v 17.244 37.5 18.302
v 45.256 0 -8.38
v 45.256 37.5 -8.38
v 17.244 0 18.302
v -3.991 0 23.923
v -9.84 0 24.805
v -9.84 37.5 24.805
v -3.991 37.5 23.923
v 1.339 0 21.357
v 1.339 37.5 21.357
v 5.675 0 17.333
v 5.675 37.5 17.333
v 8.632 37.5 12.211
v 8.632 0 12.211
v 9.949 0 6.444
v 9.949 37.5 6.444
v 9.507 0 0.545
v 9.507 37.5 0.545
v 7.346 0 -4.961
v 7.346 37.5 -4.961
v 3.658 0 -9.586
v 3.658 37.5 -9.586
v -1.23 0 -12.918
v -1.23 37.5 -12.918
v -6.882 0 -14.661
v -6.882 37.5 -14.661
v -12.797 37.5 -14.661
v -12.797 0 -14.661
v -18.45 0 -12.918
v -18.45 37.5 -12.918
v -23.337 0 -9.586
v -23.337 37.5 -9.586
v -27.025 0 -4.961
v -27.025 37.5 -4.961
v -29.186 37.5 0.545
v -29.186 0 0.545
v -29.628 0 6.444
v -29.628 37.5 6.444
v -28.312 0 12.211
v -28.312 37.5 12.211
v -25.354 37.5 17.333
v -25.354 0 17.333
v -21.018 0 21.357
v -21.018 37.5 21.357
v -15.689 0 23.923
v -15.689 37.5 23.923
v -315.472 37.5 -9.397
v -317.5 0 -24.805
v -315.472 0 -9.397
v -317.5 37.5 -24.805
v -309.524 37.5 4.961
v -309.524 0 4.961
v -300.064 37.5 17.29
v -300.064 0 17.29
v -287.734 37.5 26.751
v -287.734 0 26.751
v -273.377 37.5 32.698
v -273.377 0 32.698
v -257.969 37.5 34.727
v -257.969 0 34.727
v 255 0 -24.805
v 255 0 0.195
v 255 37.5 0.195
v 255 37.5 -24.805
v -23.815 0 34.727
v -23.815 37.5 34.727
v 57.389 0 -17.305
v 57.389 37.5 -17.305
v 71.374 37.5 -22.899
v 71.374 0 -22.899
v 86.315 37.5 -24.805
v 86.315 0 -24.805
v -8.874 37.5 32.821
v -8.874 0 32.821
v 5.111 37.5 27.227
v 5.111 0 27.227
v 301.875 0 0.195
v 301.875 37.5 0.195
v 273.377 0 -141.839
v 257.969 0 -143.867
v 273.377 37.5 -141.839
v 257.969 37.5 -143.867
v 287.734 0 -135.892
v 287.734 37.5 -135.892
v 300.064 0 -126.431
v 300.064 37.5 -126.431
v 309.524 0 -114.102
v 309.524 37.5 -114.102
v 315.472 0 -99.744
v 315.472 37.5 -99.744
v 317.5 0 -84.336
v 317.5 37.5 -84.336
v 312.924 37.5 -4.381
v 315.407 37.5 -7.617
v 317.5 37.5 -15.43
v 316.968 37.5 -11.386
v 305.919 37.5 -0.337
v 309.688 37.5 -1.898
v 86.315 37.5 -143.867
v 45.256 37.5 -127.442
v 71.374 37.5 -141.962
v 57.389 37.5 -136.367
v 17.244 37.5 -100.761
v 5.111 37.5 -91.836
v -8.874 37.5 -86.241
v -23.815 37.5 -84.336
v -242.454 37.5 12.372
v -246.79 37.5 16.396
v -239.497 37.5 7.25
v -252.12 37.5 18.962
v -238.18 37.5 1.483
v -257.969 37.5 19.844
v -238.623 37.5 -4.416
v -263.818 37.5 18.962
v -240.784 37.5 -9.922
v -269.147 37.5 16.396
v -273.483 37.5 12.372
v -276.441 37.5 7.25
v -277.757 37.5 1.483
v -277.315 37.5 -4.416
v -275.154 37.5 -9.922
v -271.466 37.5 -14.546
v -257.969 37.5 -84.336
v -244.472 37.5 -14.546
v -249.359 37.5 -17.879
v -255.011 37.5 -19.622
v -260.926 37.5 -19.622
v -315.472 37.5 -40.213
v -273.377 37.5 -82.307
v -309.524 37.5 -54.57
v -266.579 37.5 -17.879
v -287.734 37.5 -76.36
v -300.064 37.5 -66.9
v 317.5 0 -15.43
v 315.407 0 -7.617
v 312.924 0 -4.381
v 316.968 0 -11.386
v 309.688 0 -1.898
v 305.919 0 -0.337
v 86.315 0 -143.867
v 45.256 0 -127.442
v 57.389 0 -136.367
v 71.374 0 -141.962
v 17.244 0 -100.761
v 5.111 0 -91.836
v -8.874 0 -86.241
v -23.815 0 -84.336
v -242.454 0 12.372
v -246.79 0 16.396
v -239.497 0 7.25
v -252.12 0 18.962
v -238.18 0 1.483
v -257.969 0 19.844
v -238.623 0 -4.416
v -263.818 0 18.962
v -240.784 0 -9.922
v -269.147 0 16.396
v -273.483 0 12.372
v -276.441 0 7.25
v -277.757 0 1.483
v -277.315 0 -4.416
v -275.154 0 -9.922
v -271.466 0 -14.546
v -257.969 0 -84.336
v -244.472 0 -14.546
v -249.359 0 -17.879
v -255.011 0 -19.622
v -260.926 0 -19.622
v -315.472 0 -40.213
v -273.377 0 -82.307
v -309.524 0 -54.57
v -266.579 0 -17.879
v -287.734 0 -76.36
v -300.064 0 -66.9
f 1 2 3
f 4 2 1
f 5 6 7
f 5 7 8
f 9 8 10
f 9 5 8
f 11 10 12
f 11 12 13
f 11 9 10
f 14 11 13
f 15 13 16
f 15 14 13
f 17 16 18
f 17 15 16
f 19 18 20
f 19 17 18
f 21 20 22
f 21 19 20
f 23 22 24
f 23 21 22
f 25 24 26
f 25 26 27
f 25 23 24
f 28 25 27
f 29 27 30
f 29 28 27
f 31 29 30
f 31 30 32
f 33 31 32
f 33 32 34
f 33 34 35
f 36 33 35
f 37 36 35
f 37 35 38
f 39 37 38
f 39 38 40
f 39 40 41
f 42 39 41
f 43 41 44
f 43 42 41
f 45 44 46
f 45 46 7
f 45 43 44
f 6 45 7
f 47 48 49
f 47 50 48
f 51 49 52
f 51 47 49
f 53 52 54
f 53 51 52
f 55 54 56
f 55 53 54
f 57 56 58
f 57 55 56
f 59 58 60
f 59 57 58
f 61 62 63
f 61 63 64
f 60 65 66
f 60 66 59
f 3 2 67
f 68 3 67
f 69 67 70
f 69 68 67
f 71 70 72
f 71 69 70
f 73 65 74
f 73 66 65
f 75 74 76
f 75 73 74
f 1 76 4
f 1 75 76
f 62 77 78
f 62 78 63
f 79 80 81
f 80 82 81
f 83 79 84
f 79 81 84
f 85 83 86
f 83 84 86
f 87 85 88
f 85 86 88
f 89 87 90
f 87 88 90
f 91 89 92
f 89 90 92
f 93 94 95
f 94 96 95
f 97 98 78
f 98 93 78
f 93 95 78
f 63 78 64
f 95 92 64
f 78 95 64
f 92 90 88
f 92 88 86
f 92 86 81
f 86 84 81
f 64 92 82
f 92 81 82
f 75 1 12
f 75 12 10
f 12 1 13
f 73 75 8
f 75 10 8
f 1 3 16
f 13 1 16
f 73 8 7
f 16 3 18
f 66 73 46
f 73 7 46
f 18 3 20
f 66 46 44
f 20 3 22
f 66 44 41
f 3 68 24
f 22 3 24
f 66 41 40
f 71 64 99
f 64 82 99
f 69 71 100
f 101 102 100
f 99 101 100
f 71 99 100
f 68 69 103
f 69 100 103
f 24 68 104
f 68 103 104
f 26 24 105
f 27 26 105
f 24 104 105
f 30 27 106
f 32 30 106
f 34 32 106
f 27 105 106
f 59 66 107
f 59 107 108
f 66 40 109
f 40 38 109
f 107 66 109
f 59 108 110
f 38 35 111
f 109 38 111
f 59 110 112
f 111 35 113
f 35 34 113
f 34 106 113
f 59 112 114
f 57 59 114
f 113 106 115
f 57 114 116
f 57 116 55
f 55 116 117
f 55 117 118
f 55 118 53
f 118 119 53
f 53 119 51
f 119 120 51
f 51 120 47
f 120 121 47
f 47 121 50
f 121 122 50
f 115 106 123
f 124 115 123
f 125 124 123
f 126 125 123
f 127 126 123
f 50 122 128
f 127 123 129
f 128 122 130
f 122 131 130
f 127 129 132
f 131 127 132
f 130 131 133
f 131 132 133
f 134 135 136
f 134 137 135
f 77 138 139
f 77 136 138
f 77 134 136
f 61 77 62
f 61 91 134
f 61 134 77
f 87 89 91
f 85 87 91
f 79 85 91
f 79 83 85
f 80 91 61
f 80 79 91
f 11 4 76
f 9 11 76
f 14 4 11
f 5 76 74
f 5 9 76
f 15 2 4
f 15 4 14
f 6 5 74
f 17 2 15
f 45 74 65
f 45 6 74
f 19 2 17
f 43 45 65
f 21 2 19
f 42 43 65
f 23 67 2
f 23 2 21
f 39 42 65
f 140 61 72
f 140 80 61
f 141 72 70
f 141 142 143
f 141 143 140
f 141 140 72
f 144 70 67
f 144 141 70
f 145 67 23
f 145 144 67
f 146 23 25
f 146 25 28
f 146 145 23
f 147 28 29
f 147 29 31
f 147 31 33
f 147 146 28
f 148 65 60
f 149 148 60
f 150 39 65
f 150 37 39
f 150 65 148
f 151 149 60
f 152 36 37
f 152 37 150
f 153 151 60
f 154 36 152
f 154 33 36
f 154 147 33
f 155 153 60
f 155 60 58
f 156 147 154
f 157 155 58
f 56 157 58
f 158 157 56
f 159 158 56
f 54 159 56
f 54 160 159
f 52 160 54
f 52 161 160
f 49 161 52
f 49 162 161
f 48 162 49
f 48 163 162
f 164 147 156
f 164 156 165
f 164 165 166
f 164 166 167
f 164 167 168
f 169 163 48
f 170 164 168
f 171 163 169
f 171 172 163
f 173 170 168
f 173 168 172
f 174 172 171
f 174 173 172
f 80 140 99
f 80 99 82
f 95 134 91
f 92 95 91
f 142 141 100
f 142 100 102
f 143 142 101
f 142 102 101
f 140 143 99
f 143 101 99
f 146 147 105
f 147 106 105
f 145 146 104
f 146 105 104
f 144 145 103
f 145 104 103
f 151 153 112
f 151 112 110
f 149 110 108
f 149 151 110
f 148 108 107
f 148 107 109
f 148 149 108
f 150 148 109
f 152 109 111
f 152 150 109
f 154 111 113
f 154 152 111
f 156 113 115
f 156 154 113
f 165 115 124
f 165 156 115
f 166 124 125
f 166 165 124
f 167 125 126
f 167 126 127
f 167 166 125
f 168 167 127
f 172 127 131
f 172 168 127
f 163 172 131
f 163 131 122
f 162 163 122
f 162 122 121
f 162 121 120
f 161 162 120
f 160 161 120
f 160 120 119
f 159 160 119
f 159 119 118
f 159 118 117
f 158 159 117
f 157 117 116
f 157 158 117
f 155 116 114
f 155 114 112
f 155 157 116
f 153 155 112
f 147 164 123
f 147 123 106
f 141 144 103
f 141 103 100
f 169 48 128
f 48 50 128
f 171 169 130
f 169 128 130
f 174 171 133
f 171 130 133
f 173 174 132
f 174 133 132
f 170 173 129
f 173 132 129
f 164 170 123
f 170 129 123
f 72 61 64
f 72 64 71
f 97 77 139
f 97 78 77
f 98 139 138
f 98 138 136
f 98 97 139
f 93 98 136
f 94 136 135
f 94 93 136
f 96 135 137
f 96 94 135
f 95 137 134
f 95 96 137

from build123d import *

# Parameters (mm, degrees)
SKETCH1_R           = 19.84375
BOSS_EXTRUDE1_DEPTH = 37.5
FILLET1_R           = 59.53125
FILLET3_R           = 15.625


with BuildPart() as part:
    # Sketch1 → Boss-Extrude1 (new body)
    with BuildSketch(Plane(origin=(0, 0, 0), x_dir=(1, 0, 0), z_dir=(0, 1, 0))):
        Polygon((-317.5, -34.7265625), (-317.5, 84.3359375), (0, 84.3359375), (62.5, 143.8671875), (317.5, 143.8671875), (317.5, 24.8046875), (317.5, -0.1953125), (255, -0.1953125), (255, 24.8046875), (62.5, 24.8046875), (0, -34.7265625), align=None)
        with Locations(Location((-257.96875, 0, 0), (0, 0, 270))):
            Circle(SKETCH1_R, mode=Mode.SUBTRACT)
        with Locations(Location((-9.839661148, -4.9609375, 0), (0, 0, 270))):
            Circle(SKETCH1_R, mode=Mode.SUBTRACT)
    extrude(amount=BOSS_EXTRUDE1_DEPTH)

    # Fillet1
    fillet1_edges = [part.edges().sort_by_distance(p)[0] for p in [
        (62.5, 18.75, -24.8046875),
        (0, 18.75, 34.7265625),
        (0, 18.75, -84.3359375),
        (62.5, 18.75, -143.8671875),
        (317.5, 18.75, -143.8671875),
        (-317.5, 18.75, 34.7265625),
        (-317.5, 18.75, -84.3359375),
    ]]
    fillet(fillet1_edges, radius=FILLET1_R - 0.0001)  # a hair under: the kernel refuses the full size

    # Fillet3
    fillet3_edges = [part.edges().sort_by_distance(p)[0] for p in [
        (317.5, 18.75, 0.1953125),
    ]]
    fillet(fillet3_edges, radius=FILLET3_R)


solid = part.part
